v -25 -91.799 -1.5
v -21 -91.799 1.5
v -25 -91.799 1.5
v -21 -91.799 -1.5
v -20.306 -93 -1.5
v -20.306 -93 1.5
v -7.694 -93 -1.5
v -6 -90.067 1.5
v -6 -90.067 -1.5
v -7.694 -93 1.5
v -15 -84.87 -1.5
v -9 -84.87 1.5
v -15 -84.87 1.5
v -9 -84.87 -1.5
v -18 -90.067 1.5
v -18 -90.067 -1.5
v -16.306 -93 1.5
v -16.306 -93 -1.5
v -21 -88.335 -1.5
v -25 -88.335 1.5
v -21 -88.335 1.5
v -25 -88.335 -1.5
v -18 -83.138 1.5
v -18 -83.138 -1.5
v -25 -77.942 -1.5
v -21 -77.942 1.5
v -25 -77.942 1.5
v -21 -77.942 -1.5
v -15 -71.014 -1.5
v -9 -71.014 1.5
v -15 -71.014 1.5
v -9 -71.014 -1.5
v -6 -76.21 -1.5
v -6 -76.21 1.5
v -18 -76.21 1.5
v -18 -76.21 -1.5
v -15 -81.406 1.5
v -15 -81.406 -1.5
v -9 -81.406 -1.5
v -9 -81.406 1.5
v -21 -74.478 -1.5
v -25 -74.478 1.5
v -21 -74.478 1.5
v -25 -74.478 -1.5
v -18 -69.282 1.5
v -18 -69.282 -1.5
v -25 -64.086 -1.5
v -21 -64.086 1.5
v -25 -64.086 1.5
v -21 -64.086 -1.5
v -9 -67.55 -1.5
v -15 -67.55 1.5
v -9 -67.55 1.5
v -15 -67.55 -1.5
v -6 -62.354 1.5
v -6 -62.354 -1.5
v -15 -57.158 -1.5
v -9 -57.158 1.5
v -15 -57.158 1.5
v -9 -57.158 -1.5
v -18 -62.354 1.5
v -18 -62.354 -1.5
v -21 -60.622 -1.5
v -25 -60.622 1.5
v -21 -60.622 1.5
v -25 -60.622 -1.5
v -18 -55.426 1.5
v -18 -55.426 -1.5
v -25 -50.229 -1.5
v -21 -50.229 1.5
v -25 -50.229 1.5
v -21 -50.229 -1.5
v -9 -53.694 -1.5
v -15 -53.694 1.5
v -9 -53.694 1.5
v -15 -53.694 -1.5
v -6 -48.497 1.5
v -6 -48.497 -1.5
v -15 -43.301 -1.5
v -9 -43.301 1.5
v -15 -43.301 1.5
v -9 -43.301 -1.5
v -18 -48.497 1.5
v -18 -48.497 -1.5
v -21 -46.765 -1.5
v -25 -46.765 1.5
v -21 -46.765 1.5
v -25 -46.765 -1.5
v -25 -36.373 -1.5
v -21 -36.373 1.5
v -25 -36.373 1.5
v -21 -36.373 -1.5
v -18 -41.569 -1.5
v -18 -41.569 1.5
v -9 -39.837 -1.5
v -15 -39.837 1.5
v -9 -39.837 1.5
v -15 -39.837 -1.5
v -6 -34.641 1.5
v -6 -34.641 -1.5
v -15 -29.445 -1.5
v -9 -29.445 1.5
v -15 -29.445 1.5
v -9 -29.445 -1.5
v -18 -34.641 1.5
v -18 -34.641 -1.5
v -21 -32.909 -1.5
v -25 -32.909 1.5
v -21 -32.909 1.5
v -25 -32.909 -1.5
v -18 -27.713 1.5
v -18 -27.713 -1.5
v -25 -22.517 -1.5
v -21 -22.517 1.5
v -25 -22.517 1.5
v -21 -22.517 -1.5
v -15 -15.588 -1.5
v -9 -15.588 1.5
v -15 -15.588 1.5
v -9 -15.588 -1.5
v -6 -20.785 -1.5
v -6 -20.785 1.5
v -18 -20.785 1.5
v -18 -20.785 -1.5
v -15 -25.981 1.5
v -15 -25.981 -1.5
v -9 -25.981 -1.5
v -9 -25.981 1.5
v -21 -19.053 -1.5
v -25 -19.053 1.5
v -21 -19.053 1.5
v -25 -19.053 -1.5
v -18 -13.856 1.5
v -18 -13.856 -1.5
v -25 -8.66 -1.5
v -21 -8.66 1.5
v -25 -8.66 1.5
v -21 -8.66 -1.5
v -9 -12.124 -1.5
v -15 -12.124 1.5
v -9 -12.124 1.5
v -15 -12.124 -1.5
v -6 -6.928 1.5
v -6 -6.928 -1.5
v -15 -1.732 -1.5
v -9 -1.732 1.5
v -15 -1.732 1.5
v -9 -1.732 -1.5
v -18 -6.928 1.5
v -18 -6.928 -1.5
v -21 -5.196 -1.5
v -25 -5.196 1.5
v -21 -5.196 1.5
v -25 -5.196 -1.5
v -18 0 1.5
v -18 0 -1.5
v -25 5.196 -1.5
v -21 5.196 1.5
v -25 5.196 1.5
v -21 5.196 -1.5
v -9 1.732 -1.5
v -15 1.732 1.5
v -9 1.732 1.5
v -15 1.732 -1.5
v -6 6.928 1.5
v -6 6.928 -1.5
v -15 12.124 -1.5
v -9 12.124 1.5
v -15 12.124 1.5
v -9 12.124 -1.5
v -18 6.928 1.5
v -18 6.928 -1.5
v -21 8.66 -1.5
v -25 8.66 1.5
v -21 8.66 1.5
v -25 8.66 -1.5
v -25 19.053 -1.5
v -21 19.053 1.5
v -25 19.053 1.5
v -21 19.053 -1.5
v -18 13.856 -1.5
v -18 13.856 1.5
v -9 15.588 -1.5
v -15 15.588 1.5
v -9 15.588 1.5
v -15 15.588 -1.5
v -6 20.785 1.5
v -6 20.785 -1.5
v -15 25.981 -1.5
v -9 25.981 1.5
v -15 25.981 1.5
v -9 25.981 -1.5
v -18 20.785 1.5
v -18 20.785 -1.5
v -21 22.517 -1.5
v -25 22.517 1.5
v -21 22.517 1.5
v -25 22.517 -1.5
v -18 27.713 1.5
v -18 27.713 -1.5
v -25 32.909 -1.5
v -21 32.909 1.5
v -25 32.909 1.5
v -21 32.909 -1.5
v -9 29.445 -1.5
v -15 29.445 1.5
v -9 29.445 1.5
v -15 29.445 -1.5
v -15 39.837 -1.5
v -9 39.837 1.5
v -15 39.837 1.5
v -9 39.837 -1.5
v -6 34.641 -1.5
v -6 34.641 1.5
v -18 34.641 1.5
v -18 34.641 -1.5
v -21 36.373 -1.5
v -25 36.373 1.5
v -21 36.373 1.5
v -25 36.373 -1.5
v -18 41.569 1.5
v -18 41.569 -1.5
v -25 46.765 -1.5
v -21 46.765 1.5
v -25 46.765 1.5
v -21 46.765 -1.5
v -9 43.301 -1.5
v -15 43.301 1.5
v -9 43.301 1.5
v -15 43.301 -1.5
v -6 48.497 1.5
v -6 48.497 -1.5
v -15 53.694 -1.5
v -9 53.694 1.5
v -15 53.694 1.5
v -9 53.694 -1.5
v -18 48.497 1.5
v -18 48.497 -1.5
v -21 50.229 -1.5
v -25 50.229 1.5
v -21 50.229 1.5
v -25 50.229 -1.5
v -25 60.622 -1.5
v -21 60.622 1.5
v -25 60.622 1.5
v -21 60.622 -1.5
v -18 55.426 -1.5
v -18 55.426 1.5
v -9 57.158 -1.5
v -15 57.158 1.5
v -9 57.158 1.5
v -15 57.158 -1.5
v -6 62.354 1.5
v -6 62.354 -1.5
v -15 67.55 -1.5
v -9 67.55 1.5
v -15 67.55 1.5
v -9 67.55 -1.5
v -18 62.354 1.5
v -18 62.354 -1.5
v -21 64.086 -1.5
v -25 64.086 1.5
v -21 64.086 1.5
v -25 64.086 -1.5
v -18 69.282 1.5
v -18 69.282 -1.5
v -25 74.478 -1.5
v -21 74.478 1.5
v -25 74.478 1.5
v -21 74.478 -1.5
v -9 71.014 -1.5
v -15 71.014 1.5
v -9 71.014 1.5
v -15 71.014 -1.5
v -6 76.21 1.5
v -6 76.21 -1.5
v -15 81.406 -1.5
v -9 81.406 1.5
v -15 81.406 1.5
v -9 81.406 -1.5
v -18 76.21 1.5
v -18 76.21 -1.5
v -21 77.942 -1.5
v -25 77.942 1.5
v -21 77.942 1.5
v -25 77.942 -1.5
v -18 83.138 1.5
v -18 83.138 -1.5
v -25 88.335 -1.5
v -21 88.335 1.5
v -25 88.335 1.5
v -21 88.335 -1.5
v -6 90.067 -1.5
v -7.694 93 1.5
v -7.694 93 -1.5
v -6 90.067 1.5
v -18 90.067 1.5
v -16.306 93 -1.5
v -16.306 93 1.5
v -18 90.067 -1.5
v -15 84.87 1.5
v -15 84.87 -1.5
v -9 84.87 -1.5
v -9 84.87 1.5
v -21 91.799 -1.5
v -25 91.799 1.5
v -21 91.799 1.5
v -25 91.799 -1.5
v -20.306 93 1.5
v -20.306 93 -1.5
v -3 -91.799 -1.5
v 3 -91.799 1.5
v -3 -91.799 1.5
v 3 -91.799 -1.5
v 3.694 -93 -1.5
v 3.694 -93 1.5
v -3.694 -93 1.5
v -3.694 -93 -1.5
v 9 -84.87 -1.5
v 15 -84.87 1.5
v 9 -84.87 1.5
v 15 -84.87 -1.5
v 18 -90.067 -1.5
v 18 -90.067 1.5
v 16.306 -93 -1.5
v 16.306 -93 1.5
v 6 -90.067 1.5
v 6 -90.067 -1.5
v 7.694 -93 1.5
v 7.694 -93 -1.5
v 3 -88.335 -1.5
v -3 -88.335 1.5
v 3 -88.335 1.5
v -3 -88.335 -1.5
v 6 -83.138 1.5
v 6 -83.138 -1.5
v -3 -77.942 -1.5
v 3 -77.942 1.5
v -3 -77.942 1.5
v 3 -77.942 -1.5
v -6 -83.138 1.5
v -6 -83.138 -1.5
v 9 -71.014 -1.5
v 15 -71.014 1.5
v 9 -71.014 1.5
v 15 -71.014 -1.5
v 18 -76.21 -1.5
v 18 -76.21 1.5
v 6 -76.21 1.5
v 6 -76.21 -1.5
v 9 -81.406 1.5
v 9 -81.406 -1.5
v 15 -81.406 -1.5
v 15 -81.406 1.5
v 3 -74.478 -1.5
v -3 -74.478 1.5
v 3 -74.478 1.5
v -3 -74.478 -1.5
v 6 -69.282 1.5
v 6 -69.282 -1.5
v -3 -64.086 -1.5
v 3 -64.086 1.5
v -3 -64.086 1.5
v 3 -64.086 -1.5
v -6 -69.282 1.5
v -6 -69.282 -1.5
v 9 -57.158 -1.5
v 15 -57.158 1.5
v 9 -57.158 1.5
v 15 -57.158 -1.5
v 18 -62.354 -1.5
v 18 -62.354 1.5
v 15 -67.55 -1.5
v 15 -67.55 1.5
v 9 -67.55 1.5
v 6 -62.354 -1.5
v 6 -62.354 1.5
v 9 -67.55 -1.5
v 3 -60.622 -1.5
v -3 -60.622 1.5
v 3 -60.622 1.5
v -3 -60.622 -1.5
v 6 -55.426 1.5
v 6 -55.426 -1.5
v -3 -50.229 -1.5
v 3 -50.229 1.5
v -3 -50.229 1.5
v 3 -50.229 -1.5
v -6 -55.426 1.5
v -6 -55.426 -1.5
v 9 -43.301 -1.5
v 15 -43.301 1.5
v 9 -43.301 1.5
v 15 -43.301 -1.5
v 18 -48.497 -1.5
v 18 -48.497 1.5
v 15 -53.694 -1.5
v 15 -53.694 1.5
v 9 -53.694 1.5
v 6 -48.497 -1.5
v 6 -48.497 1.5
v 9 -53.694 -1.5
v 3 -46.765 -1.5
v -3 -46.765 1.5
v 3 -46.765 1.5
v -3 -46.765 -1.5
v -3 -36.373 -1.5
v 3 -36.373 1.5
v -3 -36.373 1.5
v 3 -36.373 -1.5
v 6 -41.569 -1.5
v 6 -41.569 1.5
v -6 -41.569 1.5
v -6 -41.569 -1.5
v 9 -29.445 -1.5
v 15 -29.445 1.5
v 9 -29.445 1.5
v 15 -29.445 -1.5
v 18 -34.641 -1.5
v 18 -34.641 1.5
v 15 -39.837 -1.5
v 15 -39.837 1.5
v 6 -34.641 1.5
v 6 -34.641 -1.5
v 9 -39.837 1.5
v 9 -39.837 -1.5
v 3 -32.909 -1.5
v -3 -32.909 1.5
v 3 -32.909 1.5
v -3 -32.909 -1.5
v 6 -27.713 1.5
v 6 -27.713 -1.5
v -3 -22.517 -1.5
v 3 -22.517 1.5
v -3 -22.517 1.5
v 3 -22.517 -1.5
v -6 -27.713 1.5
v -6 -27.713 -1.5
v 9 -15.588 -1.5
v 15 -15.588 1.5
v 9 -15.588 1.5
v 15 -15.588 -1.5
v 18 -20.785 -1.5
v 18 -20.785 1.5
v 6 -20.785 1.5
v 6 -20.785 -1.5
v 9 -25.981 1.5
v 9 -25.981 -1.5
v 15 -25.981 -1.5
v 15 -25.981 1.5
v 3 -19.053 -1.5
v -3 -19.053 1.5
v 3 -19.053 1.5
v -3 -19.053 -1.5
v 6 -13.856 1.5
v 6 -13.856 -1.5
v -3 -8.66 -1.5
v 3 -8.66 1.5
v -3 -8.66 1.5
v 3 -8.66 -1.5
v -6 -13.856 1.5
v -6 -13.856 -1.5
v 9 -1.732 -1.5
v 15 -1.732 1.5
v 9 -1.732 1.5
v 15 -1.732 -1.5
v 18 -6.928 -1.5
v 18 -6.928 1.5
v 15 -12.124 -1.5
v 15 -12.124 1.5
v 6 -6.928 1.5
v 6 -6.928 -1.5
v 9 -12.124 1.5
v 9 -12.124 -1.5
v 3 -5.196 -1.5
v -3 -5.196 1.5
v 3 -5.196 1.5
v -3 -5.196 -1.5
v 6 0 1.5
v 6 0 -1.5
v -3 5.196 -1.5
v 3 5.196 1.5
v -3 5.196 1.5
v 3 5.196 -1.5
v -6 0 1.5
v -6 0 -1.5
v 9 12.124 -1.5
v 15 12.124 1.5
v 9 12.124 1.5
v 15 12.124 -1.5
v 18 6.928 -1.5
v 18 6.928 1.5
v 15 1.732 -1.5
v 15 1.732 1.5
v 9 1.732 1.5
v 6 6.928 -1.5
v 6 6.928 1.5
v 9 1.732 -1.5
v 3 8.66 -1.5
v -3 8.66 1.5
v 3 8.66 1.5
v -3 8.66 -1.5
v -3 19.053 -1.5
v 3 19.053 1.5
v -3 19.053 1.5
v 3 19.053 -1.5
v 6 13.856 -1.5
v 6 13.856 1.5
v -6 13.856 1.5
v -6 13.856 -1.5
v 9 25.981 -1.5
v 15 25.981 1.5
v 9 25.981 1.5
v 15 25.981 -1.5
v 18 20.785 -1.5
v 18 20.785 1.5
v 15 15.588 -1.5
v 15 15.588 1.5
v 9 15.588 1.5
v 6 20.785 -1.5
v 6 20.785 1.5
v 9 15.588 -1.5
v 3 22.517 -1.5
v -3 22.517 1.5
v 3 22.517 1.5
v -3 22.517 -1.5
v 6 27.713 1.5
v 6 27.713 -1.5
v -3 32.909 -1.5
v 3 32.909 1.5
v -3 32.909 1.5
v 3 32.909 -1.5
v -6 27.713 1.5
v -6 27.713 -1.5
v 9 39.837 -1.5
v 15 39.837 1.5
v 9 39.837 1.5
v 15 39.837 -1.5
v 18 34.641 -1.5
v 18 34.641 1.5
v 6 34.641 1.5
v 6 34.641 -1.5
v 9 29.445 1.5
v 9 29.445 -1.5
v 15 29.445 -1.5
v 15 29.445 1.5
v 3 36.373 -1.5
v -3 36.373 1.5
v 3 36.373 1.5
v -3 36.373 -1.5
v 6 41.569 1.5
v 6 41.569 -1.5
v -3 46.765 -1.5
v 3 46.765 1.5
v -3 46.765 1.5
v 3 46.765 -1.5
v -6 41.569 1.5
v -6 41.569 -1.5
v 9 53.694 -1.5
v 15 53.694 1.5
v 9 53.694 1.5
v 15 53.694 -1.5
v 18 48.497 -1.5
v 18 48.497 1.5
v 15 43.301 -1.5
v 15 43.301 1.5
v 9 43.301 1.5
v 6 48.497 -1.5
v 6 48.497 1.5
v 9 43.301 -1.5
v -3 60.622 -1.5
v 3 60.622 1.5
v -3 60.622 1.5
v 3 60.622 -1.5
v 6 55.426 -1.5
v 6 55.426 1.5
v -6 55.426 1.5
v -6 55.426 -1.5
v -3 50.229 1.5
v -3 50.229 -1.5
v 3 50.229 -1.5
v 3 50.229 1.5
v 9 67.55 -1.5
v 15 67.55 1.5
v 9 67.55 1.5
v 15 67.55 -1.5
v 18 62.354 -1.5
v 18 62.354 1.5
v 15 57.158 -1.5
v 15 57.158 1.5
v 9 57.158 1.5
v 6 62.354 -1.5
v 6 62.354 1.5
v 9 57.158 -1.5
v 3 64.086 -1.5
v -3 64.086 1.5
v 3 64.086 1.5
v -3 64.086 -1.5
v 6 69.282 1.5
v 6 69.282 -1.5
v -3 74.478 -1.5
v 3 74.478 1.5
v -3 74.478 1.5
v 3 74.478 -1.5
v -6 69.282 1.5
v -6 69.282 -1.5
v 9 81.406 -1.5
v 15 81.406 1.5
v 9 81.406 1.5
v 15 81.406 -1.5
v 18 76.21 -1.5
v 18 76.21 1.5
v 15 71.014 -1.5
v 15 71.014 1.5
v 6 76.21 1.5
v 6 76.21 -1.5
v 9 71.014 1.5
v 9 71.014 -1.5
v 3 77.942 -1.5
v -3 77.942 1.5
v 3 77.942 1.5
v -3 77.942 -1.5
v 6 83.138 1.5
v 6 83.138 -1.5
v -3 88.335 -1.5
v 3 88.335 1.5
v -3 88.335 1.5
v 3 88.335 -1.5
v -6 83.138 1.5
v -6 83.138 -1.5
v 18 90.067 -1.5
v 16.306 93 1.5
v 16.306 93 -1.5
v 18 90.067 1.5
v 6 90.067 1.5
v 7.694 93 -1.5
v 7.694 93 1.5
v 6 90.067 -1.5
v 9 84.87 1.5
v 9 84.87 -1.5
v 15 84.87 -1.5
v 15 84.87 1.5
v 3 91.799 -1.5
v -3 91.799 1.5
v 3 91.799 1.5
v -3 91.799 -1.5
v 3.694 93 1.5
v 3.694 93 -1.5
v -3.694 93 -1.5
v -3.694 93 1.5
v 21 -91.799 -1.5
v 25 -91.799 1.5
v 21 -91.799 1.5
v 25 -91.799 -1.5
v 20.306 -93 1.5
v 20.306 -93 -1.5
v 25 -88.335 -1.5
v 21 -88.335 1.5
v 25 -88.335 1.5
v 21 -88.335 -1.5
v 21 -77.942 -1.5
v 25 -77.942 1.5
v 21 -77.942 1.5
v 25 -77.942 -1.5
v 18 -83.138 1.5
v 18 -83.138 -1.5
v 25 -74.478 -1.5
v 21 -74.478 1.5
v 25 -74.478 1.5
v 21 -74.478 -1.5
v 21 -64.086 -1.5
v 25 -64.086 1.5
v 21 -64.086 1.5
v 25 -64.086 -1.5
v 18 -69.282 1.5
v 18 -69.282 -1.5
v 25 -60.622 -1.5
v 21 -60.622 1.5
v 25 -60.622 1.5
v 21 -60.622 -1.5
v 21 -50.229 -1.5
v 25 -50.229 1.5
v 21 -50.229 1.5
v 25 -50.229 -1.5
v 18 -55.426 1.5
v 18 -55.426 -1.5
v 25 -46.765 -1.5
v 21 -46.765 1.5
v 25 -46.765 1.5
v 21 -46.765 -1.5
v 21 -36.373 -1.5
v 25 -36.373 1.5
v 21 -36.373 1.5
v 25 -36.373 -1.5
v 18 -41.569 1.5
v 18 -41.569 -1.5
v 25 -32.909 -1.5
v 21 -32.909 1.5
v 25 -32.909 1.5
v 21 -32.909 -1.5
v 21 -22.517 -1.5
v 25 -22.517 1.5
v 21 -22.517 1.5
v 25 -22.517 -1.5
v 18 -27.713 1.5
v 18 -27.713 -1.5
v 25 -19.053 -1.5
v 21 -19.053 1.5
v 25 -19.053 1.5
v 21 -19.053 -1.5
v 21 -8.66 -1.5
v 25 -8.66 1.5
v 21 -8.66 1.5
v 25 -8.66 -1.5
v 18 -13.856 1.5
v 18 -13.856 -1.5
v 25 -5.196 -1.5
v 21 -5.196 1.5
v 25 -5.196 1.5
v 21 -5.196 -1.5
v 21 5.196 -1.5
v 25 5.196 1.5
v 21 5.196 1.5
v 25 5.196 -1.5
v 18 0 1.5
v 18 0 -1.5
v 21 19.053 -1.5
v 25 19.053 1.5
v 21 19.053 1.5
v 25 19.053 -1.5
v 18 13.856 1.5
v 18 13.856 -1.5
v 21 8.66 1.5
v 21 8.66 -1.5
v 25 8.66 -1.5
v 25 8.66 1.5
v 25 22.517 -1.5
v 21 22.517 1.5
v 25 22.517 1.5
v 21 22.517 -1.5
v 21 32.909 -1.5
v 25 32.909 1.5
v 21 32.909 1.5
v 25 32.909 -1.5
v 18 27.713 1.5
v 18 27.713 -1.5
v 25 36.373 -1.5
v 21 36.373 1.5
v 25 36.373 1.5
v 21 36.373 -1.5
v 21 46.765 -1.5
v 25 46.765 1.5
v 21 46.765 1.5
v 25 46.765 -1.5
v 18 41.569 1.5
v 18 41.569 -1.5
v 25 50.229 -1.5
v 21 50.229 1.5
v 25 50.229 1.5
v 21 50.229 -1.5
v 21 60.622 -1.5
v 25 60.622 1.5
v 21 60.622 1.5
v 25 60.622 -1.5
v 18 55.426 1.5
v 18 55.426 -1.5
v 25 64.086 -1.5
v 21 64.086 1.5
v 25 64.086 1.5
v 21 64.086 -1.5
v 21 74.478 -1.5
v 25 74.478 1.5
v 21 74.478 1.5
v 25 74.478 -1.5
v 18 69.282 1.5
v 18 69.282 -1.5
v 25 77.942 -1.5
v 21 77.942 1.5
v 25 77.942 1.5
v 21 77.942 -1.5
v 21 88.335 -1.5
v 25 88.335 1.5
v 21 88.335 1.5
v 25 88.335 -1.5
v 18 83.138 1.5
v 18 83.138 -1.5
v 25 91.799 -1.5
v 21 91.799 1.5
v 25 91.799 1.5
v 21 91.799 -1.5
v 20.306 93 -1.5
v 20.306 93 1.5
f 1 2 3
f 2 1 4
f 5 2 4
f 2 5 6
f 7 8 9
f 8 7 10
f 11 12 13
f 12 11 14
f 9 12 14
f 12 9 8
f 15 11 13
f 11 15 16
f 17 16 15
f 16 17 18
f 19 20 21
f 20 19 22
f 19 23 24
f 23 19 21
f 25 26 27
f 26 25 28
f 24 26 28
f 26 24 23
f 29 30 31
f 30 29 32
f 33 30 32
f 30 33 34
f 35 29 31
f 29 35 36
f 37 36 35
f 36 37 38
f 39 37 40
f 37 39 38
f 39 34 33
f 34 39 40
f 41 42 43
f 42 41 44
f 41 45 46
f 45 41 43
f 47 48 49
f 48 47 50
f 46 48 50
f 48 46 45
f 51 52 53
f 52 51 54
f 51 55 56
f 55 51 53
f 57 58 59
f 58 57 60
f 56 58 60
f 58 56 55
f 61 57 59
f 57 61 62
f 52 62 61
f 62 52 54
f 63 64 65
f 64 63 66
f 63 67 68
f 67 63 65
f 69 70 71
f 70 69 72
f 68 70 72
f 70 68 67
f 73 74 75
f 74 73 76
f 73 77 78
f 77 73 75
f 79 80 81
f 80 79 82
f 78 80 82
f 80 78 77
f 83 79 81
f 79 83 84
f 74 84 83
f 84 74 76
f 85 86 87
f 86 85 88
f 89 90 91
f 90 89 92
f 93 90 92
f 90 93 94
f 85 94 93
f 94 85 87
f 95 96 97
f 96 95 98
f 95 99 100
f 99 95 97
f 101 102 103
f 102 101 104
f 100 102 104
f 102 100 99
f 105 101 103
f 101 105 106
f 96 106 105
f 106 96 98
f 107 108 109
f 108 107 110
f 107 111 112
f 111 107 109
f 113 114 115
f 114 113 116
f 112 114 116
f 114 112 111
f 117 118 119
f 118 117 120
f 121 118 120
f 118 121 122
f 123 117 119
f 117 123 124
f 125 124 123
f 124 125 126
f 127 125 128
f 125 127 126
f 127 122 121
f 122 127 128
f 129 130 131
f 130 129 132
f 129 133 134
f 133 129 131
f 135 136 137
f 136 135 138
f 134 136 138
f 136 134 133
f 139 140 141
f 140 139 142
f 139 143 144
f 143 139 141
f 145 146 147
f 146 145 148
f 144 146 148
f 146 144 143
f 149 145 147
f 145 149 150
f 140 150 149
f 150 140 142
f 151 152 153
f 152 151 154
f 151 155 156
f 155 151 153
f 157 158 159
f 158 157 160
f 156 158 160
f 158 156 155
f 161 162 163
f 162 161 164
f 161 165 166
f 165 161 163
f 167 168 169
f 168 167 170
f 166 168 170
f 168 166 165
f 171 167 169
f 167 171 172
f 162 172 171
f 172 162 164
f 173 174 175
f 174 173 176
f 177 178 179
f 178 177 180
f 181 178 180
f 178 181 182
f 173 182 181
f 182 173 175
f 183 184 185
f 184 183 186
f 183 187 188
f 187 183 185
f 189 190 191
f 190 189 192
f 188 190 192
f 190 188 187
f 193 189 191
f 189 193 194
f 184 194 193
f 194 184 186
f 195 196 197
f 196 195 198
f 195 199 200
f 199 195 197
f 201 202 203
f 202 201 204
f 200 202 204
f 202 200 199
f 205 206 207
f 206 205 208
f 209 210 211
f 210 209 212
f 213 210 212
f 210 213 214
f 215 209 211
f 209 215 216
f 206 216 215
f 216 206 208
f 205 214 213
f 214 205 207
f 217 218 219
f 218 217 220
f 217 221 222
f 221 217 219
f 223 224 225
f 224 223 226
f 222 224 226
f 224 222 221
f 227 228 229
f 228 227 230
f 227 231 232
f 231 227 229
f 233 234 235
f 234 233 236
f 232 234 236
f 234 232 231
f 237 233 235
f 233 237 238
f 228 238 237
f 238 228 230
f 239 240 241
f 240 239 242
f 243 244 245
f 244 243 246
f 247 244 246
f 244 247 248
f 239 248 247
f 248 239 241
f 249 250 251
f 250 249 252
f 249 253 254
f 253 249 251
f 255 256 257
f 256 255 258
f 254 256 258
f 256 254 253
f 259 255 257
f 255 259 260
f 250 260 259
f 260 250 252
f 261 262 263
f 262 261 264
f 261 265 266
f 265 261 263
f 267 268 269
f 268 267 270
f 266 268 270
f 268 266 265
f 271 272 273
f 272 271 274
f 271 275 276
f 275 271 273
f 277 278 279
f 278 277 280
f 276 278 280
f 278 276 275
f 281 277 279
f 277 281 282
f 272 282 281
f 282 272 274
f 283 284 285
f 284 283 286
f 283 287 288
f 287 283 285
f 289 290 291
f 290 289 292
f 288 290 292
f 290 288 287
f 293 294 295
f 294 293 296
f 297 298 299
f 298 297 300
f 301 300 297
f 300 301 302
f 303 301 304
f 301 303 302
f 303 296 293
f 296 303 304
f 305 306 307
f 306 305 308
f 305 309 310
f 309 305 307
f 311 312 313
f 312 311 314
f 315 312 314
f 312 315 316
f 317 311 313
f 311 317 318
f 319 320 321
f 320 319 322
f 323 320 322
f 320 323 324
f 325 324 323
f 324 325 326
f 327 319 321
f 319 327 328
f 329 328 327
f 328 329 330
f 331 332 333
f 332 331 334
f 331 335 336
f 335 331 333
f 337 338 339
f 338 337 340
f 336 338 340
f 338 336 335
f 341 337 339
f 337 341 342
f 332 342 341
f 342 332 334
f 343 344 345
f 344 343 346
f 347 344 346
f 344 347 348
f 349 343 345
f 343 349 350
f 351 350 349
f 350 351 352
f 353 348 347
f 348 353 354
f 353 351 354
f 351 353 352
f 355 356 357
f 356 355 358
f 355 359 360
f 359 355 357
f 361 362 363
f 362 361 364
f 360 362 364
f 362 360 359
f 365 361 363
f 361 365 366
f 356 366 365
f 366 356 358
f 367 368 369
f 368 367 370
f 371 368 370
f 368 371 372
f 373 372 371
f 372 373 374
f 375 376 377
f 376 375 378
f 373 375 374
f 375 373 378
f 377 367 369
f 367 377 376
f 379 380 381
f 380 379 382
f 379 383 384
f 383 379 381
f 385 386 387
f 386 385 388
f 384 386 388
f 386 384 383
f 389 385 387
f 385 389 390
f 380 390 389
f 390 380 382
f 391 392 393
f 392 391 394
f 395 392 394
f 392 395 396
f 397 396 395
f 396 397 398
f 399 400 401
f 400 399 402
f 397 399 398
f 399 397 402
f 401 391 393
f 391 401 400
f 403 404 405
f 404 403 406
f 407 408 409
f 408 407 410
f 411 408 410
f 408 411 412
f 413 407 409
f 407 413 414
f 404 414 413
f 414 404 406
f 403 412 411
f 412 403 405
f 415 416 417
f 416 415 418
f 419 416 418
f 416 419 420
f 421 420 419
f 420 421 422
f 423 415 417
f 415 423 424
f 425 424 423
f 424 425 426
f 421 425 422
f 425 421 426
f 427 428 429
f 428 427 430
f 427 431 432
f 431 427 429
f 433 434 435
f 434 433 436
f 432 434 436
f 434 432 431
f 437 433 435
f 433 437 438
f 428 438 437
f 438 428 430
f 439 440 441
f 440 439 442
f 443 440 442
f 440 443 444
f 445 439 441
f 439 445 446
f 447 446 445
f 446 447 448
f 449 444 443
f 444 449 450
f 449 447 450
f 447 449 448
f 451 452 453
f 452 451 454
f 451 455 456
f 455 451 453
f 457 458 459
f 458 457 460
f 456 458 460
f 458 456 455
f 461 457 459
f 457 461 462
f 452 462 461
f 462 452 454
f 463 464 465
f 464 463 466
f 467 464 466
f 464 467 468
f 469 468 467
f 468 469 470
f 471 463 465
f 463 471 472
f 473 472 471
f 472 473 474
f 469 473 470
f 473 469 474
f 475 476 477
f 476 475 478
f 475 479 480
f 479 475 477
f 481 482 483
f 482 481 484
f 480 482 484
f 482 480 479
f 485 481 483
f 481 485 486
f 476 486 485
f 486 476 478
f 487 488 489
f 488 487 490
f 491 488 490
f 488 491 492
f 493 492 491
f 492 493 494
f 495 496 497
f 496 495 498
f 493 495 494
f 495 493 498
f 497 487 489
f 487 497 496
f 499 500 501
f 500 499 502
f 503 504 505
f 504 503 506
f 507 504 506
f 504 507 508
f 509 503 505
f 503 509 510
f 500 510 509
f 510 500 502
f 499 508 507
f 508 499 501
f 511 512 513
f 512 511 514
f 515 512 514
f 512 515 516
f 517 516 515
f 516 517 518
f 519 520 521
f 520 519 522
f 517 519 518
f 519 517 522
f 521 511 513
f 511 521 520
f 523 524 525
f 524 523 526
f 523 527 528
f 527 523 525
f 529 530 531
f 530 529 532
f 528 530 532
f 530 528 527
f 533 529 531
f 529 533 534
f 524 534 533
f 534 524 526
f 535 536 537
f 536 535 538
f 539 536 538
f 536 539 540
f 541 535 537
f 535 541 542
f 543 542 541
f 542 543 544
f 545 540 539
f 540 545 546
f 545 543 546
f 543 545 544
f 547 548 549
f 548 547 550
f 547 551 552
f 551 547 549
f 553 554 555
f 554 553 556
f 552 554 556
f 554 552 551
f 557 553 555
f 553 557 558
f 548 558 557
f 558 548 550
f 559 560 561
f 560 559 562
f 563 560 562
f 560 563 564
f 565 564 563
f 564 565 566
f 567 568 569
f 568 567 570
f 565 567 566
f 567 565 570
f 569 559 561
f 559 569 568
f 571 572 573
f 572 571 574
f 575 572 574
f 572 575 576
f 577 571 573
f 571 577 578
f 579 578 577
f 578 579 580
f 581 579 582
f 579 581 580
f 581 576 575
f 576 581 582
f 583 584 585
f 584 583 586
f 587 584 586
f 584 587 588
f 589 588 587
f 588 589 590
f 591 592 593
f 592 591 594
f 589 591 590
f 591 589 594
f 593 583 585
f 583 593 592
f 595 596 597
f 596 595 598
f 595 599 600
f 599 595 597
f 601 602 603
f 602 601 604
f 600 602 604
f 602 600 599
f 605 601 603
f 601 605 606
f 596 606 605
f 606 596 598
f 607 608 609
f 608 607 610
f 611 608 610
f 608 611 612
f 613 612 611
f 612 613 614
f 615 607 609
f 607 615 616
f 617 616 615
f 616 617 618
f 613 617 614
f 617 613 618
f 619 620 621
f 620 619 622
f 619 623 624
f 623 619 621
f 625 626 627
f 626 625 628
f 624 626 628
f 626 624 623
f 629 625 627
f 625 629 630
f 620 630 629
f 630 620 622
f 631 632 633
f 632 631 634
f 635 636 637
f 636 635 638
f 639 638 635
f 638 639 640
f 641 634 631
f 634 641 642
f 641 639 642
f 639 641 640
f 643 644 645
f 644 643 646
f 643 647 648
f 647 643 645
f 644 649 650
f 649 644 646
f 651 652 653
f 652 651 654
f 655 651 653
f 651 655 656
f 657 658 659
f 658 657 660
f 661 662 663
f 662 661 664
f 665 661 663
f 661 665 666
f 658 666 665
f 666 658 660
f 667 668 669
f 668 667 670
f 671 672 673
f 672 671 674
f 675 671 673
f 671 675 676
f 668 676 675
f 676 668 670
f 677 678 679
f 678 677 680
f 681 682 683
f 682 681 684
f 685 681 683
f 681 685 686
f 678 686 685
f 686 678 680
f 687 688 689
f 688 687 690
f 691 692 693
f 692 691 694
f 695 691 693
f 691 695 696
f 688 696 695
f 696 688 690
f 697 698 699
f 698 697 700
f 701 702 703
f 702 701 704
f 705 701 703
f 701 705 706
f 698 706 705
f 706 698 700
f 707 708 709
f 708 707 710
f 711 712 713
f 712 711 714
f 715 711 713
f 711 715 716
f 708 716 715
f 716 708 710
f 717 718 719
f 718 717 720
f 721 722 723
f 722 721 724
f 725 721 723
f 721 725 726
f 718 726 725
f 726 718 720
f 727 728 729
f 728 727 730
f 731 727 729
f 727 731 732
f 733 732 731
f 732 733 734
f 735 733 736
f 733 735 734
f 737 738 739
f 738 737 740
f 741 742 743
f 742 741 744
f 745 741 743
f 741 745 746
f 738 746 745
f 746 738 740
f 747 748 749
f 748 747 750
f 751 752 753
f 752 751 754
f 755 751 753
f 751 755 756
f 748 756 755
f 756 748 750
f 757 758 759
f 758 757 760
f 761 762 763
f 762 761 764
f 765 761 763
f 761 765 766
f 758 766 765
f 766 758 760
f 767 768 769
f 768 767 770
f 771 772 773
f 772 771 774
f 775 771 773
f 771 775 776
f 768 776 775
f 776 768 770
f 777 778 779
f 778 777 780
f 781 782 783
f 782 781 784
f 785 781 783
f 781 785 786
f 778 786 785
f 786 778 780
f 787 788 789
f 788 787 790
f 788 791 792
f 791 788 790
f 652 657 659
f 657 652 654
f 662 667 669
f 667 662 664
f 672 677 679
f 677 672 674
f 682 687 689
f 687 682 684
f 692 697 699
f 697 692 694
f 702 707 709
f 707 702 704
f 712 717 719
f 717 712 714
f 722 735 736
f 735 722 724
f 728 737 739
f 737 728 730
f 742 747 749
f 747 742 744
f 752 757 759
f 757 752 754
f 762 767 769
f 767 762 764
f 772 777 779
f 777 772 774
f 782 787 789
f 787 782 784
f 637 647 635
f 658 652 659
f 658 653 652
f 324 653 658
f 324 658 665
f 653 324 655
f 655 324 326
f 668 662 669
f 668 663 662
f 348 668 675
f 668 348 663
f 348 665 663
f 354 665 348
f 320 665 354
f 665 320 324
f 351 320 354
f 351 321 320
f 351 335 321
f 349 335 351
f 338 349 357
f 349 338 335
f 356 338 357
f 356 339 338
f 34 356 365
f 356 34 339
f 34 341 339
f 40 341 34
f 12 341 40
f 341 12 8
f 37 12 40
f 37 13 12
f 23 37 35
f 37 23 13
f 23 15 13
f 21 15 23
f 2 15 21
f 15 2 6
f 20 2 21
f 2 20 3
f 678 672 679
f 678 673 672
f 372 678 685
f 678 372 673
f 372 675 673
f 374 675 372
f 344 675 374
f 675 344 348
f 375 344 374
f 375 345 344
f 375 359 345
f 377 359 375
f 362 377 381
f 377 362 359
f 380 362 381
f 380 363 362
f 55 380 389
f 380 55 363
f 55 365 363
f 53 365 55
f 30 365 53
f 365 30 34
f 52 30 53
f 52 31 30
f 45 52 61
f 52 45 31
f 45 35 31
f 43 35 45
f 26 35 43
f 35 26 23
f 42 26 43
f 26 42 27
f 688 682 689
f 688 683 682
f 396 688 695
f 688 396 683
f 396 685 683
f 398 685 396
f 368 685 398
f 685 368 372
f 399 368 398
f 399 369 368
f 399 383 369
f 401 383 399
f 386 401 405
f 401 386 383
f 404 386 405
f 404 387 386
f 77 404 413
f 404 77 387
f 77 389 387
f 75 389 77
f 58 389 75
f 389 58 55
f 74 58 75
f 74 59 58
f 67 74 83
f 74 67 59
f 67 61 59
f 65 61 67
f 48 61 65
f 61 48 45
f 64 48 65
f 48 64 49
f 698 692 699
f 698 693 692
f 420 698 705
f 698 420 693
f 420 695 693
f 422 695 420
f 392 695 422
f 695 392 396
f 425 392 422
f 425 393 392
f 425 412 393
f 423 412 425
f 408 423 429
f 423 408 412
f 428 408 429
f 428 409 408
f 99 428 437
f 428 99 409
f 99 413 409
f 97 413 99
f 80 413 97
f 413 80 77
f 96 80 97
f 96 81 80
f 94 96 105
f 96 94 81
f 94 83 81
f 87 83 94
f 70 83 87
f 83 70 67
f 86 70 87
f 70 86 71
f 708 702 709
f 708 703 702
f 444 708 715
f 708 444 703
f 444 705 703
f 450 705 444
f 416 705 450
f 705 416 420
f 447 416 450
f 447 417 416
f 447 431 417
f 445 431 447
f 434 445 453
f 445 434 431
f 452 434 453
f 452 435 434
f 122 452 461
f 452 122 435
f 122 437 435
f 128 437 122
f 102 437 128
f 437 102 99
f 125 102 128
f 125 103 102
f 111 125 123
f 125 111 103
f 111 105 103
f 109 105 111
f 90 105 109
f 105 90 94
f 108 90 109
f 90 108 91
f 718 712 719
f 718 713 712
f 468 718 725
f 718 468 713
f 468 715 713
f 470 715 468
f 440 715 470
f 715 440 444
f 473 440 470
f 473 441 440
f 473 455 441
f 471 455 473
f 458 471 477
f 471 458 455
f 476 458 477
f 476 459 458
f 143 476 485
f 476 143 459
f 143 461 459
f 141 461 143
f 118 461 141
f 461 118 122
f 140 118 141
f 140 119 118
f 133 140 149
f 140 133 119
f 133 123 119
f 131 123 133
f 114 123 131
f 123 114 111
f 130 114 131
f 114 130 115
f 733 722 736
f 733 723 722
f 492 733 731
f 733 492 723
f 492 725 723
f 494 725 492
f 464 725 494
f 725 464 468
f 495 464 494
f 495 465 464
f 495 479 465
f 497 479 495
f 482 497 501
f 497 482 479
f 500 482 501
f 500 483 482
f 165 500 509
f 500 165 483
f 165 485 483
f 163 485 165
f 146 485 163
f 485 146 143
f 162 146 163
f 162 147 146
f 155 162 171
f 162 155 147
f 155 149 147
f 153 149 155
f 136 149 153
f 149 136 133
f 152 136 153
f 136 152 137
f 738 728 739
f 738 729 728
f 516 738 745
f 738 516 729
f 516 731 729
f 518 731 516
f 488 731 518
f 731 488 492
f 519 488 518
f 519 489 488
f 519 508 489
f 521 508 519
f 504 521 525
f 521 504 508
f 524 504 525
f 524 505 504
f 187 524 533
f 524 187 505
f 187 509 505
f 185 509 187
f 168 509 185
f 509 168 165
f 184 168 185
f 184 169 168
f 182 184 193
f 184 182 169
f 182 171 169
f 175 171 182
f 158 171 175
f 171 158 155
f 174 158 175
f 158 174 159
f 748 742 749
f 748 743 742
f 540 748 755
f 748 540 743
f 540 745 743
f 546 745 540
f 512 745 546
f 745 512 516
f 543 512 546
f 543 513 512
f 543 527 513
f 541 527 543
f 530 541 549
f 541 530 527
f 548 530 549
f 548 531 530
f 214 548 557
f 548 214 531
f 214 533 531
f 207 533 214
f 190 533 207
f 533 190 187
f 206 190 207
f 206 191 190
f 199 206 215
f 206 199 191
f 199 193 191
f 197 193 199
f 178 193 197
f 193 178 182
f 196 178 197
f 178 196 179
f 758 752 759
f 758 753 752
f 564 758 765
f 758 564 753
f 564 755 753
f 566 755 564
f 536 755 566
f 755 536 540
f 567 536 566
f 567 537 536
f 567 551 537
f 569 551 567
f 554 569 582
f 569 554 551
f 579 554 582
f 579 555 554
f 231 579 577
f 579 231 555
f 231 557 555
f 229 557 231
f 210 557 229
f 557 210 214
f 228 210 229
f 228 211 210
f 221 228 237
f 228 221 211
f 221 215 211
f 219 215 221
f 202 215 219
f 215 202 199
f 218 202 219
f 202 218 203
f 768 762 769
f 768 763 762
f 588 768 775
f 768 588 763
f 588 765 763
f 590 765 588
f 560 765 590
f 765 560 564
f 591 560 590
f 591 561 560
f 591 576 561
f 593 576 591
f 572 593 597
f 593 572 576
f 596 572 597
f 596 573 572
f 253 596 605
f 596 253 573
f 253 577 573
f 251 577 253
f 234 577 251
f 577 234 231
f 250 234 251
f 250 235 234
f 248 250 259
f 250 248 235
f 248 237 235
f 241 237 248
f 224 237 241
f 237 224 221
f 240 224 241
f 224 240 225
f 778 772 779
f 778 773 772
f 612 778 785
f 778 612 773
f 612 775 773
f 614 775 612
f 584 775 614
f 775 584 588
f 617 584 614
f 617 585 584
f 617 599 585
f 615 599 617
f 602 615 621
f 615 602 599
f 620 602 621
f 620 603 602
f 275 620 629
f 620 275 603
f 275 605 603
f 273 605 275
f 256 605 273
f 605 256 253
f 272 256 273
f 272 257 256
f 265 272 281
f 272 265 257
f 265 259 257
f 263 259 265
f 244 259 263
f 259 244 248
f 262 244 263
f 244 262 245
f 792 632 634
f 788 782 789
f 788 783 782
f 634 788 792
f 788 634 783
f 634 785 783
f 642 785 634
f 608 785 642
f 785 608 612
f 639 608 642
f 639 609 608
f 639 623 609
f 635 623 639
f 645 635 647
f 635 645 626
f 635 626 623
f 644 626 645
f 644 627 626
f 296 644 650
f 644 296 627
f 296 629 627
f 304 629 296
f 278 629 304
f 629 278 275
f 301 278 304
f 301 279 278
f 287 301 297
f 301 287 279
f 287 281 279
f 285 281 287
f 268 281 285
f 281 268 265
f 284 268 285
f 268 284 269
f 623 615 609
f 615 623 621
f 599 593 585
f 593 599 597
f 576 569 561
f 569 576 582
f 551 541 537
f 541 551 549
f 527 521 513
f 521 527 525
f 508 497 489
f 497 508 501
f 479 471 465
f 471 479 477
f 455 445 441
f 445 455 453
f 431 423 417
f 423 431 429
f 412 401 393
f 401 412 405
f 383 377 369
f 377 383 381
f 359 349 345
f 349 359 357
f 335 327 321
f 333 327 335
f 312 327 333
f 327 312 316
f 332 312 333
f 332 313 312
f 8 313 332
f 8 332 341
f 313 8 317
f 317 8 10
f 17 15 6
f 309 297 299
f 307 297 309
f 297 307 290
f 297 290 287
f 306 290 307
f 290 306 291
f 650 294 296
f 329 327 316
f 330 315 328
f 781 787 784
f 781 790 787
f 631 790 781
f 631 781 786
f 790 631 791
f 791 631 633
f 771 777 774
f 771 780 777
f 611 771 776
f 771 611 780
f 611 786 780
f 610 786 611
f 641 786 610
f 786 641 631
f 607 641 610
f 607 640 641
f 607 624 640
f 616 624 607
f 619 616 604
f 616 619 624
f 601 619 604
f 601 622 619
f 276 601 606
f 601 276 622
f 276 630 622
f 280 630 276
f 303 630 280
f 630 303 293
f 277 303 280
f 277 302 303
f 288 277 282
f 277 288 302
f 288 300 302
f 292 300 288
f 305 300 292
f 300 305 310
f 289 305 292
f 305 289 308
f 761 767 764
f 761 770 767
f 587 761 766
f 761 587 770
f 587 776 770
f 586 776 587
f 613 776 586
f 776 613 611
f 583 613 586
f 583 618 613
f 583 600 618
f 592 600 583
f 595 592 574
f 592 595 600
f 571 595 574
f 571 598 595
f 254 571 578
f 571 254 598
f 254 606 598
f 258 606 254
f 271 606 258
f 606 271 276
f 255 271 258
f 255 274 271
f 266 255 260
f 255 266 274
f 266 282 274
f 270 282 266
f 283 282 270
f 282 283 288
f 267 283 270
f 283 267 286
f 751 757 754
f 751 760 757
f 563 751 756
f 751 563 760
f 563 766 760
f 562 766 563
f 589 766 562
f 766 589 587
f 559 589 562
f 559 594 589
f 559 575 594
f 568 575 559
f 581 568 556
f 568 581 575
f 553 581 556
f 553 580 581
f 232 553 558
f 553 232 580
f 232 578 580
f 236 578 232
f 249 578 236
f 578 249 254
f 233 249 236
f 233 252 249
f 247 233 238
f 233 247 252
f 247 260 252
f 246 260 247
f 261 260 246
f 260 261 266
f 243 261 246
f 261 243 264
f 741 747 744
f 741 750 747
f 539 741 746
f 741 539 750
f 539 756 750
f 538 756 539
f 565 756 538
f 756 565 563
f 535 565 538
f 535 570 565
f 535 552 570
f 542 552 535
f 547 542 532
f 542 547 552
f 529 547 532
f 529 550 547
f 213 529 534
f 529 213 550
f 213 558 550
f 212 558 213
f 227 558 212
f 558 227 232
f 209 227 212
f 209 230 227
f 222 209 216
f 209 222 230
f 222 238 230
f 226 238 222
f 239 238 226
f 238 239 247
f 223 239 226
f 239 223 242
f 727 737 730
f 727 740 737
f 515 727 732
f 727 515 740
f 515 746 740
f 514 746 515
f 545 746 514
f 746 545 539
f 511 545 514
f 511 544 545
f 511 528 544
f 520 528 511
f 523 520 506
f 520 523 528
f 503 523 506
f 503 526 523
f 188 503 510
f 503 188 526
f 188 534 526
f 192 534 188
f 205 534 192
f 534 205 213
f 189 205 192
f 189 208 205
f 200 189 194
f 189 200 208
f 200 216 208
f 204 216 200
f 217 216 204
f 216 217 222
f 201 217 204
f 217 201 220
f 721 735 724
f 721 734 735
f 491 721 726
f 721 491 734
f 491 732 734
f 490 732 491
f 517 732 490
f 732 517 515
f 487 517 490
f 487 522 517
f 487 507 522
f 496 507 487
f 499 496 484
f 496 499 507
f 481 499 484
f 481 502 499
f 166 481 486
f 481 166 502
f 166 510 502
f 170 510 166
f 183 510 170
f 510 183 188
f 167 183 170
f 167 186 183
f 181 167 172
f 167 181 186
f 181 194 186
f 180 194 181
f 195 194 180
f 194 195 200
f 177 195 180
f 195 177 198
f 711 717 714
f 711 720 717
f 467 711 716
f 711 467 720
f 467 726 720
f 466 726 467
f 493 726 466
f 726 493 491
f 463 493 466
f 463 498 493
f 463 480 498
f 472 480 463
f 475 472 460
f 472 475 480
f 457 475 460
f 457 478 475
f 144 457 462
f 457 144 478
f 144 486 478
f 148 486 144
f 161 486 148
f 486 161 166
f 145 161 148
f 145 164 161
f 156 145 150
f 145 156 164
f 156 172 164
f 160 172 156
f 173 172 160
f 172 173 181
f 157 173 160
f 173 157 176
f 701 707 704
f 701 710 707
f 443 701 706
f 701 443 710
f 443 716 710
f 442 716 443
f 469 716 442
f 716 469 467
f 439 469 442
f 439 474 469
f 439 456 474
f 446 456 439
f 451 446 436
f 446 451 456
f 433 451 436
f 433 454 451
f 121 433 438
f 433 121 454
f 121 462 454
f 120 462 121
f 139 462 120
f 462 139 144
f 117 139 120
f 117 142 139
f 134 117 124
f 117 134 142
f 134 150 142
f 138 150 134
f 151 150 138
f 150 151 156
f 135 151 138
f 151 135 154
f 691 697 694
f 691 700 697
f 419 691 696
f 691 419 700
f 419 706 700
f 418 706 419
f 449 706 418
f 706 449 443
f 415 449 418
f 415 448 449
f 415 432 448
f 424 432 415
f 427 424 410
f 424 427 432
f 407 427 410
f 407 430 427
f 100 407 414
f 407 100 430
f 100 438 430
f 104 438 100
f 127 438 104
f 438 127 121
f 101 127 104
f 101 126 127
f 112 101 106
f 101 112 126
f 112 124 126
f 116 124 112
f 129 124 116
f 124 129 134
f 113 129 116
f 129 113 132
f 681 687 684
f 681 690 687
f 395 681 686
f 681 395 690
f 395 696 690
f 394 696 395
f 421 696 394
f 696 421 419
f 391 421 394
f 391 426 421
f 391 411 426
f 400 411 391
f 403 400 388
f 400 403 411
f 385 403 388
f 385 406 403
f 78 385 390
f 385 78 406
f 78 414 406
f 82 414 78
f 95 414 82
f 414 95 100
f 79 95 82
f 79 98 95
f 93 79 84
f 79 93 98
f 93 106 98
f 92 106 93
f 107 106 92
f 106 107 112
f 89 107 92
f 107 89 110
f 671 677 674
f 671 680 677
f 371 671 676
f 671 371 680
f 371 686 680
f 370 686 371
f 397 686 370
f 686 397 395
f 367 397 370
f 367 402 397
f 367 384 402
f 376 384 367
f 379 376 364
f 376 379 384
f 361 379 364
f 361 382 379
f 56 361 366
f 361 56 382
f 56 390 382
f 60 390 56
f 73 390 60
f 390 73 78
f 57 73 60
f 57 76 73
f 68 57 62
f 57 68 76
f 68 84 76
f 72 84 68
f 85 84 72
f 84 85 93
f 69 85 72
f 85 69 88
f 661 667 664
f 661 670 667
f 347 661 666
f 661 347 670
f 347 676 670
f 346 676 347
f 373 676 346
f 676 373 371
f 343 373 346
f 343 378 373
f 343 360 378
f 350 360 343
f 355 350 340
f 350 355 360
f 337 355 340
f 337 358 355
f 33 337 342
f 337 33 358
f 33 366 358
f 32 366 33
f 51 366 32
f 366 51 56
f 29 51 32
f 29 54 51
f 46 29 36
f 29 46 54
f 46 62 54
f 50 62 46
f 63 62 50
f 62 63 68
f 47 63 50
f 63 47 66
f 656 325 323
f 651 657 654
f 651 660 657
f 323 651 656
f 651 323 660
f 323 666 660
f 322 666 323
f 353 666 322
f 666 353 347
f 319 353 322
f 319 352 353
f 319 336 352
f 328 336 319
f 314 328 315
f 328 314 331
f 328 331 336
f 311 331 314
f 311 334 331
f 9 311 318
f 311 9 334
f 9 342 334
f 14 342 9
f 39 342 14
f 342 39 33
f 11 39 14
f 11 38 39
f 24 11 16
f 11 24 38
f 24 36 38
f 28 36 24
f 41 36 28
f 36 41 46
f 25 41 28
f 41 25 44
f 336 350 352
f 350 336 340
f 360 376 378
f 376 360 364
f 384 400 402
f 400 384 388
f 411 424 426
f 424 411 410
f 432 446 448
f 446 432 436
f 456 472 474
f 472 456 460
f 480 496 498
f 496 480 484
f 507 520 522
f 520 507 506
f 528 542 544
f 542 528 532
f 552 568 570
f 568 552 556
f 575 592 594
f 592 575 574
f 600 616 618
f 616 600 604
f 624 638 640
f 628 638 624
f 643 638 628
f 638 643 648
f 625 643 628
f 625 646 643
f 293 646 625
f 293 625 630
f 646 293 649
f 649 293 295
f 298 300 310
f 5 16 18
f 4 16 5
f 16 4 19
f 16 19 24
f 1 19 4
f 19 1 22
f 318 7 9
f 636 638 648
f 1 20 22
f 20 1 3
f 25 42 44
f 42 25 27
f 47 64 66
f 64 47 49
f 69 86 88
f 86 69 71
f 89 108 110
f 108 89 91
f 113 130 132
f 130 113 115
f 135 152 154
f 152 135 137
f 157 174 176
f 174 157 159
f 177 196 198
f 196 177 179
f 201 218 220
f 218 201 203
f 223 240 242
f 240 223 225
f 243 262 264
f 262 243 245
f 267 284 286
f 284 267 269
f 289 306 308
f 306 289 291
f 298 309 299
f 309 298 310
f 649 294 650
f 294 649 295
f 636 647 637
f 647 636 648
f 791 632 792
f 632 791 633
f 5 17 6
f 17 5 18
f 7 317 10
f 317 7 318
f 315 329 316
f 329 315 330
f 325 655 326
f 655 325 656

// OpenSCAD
//---------------------------------------------------------------
//-- Openscad Honeycomb mesh used in Cool PCB Enclosure (http://www.thingiverse.com/thing:1665075).
//-- This is a simple honeycomb, reusing ideas and code from the following excellent projects:
//--   + "Customizable Fan Grille" (http://www.thingiverse.com/thing:52305).
//--   + "Radiator difussers" (http://www.thingiverse.com/thing:Resolution07)
//-- IMPORTANT NOTES:
//--   + The coordinate system is mostly center based in order to simplify the integration between different projects involved.
//-- Version: 1.0
//-- Jul-2016
//---------------------------------------------------------------
//-- Released under the GPL3 license
//---------------------------------------------------------------

//---------------------------------------------------------------
//-- CUSTOMIZER PARAMETERS
//---------------------------------------------------------------

// - honeycomb length
hc_length = 186;
// - honeycomb width
hc_width = 50;
// - honeycomb height
hc_height = 3;
// - hexagon hole diameter
hexagon_diameter = 12;
// - hexagon frame thickness
hexagon_thickness = 4    ;


/* [HIDDEN] */

box = [hc_width, hc_length, hc_height];



//---------------------------------------------------------------
//-- MODULES
//---------------------------------------------------------------



// * HONEYCOMB

module hexagonal_grid(box, hexagon_diameter, hexagon_thickness){
// first arg is vector that defines the bounding box, length, width, height
// second arg in the 'diameter' of the holes. In OpenScad, this refers to the corner-to-corner diameter, not flat-to-flat
// this diameter is 2/sqrt(3) times larger than flat to flat
// third arg is wall thickness.  This also is measured that the corners, not the flats. 

// example 
//    hexagonal_grid([25, 25, 5], 5, 1);

    difference(){
        cube(box, center = true);
        hexgrid(box, hexagon_diameter, hexagon_thickness);
    }
}


module hex_hole(hexdiameter, height){
        translate([0, 0, 0]) rotate([0, 0, 0]) cylinder(d = hexdiameter, h = height, center = true, $fn = 6);
}


module hexgrid(box, hexagon_diameter, hexagon_thickness) {
    cos60 = cos(60);
    sin60 = sin(60);
    d = hexagon_diameter + hexagon_thickness;
    a = d*sin60;

    moduloX = (box[0] % (2*a*sin60));
//    numX = (box[0] - moduloX) / a;
    numX =  floor(box[0] / (2*a*sin60));
    oddX = numX % 2;
    numberX = numX;

    moduloY = (box[1] % a);
//    numY = (box[1] - moduloY) / a;
    numY =  floor(box[1]/a);
    oddY = numY % 2;
    numberY = numY;

// Center the central hexagon on the origin of coordinates
    deltaY = oddY == 1 ? a/2 : 0;

    x0 = (numberX + 2) * 2*a*sin60;
    y0 = (numberY + 2) * a/2 + deltaY;

    for(x = [ -x0: 2*a*sin60 : x0]) {
        for(y = [ -y0 : a : y0]) {
            translate([x, y, 0]) hex_hole(hexdiameter = hexagon_diameter, height = box[2] + 0.001);
           translate([x + a*sin60, y + a*cos60 , 0]) hex_hole(hexdiameter = hexagon_diameter, height = box[2] + 0.001);
// echo ([x, y]);
// echo ([x + a*sin60, y + a*cos60]);
            
         } //fo
    } //fo
} //mo

// * END OF HONEYCOMB



//---------------------------------------------------------------
//-- RENDERS
//---------------------------------------------------------------


    hexagonal_grid(box, hexagon_diameter, hexagon_thickness);
//    hexagonal_grid([25, 25, 5], 5, 1);
